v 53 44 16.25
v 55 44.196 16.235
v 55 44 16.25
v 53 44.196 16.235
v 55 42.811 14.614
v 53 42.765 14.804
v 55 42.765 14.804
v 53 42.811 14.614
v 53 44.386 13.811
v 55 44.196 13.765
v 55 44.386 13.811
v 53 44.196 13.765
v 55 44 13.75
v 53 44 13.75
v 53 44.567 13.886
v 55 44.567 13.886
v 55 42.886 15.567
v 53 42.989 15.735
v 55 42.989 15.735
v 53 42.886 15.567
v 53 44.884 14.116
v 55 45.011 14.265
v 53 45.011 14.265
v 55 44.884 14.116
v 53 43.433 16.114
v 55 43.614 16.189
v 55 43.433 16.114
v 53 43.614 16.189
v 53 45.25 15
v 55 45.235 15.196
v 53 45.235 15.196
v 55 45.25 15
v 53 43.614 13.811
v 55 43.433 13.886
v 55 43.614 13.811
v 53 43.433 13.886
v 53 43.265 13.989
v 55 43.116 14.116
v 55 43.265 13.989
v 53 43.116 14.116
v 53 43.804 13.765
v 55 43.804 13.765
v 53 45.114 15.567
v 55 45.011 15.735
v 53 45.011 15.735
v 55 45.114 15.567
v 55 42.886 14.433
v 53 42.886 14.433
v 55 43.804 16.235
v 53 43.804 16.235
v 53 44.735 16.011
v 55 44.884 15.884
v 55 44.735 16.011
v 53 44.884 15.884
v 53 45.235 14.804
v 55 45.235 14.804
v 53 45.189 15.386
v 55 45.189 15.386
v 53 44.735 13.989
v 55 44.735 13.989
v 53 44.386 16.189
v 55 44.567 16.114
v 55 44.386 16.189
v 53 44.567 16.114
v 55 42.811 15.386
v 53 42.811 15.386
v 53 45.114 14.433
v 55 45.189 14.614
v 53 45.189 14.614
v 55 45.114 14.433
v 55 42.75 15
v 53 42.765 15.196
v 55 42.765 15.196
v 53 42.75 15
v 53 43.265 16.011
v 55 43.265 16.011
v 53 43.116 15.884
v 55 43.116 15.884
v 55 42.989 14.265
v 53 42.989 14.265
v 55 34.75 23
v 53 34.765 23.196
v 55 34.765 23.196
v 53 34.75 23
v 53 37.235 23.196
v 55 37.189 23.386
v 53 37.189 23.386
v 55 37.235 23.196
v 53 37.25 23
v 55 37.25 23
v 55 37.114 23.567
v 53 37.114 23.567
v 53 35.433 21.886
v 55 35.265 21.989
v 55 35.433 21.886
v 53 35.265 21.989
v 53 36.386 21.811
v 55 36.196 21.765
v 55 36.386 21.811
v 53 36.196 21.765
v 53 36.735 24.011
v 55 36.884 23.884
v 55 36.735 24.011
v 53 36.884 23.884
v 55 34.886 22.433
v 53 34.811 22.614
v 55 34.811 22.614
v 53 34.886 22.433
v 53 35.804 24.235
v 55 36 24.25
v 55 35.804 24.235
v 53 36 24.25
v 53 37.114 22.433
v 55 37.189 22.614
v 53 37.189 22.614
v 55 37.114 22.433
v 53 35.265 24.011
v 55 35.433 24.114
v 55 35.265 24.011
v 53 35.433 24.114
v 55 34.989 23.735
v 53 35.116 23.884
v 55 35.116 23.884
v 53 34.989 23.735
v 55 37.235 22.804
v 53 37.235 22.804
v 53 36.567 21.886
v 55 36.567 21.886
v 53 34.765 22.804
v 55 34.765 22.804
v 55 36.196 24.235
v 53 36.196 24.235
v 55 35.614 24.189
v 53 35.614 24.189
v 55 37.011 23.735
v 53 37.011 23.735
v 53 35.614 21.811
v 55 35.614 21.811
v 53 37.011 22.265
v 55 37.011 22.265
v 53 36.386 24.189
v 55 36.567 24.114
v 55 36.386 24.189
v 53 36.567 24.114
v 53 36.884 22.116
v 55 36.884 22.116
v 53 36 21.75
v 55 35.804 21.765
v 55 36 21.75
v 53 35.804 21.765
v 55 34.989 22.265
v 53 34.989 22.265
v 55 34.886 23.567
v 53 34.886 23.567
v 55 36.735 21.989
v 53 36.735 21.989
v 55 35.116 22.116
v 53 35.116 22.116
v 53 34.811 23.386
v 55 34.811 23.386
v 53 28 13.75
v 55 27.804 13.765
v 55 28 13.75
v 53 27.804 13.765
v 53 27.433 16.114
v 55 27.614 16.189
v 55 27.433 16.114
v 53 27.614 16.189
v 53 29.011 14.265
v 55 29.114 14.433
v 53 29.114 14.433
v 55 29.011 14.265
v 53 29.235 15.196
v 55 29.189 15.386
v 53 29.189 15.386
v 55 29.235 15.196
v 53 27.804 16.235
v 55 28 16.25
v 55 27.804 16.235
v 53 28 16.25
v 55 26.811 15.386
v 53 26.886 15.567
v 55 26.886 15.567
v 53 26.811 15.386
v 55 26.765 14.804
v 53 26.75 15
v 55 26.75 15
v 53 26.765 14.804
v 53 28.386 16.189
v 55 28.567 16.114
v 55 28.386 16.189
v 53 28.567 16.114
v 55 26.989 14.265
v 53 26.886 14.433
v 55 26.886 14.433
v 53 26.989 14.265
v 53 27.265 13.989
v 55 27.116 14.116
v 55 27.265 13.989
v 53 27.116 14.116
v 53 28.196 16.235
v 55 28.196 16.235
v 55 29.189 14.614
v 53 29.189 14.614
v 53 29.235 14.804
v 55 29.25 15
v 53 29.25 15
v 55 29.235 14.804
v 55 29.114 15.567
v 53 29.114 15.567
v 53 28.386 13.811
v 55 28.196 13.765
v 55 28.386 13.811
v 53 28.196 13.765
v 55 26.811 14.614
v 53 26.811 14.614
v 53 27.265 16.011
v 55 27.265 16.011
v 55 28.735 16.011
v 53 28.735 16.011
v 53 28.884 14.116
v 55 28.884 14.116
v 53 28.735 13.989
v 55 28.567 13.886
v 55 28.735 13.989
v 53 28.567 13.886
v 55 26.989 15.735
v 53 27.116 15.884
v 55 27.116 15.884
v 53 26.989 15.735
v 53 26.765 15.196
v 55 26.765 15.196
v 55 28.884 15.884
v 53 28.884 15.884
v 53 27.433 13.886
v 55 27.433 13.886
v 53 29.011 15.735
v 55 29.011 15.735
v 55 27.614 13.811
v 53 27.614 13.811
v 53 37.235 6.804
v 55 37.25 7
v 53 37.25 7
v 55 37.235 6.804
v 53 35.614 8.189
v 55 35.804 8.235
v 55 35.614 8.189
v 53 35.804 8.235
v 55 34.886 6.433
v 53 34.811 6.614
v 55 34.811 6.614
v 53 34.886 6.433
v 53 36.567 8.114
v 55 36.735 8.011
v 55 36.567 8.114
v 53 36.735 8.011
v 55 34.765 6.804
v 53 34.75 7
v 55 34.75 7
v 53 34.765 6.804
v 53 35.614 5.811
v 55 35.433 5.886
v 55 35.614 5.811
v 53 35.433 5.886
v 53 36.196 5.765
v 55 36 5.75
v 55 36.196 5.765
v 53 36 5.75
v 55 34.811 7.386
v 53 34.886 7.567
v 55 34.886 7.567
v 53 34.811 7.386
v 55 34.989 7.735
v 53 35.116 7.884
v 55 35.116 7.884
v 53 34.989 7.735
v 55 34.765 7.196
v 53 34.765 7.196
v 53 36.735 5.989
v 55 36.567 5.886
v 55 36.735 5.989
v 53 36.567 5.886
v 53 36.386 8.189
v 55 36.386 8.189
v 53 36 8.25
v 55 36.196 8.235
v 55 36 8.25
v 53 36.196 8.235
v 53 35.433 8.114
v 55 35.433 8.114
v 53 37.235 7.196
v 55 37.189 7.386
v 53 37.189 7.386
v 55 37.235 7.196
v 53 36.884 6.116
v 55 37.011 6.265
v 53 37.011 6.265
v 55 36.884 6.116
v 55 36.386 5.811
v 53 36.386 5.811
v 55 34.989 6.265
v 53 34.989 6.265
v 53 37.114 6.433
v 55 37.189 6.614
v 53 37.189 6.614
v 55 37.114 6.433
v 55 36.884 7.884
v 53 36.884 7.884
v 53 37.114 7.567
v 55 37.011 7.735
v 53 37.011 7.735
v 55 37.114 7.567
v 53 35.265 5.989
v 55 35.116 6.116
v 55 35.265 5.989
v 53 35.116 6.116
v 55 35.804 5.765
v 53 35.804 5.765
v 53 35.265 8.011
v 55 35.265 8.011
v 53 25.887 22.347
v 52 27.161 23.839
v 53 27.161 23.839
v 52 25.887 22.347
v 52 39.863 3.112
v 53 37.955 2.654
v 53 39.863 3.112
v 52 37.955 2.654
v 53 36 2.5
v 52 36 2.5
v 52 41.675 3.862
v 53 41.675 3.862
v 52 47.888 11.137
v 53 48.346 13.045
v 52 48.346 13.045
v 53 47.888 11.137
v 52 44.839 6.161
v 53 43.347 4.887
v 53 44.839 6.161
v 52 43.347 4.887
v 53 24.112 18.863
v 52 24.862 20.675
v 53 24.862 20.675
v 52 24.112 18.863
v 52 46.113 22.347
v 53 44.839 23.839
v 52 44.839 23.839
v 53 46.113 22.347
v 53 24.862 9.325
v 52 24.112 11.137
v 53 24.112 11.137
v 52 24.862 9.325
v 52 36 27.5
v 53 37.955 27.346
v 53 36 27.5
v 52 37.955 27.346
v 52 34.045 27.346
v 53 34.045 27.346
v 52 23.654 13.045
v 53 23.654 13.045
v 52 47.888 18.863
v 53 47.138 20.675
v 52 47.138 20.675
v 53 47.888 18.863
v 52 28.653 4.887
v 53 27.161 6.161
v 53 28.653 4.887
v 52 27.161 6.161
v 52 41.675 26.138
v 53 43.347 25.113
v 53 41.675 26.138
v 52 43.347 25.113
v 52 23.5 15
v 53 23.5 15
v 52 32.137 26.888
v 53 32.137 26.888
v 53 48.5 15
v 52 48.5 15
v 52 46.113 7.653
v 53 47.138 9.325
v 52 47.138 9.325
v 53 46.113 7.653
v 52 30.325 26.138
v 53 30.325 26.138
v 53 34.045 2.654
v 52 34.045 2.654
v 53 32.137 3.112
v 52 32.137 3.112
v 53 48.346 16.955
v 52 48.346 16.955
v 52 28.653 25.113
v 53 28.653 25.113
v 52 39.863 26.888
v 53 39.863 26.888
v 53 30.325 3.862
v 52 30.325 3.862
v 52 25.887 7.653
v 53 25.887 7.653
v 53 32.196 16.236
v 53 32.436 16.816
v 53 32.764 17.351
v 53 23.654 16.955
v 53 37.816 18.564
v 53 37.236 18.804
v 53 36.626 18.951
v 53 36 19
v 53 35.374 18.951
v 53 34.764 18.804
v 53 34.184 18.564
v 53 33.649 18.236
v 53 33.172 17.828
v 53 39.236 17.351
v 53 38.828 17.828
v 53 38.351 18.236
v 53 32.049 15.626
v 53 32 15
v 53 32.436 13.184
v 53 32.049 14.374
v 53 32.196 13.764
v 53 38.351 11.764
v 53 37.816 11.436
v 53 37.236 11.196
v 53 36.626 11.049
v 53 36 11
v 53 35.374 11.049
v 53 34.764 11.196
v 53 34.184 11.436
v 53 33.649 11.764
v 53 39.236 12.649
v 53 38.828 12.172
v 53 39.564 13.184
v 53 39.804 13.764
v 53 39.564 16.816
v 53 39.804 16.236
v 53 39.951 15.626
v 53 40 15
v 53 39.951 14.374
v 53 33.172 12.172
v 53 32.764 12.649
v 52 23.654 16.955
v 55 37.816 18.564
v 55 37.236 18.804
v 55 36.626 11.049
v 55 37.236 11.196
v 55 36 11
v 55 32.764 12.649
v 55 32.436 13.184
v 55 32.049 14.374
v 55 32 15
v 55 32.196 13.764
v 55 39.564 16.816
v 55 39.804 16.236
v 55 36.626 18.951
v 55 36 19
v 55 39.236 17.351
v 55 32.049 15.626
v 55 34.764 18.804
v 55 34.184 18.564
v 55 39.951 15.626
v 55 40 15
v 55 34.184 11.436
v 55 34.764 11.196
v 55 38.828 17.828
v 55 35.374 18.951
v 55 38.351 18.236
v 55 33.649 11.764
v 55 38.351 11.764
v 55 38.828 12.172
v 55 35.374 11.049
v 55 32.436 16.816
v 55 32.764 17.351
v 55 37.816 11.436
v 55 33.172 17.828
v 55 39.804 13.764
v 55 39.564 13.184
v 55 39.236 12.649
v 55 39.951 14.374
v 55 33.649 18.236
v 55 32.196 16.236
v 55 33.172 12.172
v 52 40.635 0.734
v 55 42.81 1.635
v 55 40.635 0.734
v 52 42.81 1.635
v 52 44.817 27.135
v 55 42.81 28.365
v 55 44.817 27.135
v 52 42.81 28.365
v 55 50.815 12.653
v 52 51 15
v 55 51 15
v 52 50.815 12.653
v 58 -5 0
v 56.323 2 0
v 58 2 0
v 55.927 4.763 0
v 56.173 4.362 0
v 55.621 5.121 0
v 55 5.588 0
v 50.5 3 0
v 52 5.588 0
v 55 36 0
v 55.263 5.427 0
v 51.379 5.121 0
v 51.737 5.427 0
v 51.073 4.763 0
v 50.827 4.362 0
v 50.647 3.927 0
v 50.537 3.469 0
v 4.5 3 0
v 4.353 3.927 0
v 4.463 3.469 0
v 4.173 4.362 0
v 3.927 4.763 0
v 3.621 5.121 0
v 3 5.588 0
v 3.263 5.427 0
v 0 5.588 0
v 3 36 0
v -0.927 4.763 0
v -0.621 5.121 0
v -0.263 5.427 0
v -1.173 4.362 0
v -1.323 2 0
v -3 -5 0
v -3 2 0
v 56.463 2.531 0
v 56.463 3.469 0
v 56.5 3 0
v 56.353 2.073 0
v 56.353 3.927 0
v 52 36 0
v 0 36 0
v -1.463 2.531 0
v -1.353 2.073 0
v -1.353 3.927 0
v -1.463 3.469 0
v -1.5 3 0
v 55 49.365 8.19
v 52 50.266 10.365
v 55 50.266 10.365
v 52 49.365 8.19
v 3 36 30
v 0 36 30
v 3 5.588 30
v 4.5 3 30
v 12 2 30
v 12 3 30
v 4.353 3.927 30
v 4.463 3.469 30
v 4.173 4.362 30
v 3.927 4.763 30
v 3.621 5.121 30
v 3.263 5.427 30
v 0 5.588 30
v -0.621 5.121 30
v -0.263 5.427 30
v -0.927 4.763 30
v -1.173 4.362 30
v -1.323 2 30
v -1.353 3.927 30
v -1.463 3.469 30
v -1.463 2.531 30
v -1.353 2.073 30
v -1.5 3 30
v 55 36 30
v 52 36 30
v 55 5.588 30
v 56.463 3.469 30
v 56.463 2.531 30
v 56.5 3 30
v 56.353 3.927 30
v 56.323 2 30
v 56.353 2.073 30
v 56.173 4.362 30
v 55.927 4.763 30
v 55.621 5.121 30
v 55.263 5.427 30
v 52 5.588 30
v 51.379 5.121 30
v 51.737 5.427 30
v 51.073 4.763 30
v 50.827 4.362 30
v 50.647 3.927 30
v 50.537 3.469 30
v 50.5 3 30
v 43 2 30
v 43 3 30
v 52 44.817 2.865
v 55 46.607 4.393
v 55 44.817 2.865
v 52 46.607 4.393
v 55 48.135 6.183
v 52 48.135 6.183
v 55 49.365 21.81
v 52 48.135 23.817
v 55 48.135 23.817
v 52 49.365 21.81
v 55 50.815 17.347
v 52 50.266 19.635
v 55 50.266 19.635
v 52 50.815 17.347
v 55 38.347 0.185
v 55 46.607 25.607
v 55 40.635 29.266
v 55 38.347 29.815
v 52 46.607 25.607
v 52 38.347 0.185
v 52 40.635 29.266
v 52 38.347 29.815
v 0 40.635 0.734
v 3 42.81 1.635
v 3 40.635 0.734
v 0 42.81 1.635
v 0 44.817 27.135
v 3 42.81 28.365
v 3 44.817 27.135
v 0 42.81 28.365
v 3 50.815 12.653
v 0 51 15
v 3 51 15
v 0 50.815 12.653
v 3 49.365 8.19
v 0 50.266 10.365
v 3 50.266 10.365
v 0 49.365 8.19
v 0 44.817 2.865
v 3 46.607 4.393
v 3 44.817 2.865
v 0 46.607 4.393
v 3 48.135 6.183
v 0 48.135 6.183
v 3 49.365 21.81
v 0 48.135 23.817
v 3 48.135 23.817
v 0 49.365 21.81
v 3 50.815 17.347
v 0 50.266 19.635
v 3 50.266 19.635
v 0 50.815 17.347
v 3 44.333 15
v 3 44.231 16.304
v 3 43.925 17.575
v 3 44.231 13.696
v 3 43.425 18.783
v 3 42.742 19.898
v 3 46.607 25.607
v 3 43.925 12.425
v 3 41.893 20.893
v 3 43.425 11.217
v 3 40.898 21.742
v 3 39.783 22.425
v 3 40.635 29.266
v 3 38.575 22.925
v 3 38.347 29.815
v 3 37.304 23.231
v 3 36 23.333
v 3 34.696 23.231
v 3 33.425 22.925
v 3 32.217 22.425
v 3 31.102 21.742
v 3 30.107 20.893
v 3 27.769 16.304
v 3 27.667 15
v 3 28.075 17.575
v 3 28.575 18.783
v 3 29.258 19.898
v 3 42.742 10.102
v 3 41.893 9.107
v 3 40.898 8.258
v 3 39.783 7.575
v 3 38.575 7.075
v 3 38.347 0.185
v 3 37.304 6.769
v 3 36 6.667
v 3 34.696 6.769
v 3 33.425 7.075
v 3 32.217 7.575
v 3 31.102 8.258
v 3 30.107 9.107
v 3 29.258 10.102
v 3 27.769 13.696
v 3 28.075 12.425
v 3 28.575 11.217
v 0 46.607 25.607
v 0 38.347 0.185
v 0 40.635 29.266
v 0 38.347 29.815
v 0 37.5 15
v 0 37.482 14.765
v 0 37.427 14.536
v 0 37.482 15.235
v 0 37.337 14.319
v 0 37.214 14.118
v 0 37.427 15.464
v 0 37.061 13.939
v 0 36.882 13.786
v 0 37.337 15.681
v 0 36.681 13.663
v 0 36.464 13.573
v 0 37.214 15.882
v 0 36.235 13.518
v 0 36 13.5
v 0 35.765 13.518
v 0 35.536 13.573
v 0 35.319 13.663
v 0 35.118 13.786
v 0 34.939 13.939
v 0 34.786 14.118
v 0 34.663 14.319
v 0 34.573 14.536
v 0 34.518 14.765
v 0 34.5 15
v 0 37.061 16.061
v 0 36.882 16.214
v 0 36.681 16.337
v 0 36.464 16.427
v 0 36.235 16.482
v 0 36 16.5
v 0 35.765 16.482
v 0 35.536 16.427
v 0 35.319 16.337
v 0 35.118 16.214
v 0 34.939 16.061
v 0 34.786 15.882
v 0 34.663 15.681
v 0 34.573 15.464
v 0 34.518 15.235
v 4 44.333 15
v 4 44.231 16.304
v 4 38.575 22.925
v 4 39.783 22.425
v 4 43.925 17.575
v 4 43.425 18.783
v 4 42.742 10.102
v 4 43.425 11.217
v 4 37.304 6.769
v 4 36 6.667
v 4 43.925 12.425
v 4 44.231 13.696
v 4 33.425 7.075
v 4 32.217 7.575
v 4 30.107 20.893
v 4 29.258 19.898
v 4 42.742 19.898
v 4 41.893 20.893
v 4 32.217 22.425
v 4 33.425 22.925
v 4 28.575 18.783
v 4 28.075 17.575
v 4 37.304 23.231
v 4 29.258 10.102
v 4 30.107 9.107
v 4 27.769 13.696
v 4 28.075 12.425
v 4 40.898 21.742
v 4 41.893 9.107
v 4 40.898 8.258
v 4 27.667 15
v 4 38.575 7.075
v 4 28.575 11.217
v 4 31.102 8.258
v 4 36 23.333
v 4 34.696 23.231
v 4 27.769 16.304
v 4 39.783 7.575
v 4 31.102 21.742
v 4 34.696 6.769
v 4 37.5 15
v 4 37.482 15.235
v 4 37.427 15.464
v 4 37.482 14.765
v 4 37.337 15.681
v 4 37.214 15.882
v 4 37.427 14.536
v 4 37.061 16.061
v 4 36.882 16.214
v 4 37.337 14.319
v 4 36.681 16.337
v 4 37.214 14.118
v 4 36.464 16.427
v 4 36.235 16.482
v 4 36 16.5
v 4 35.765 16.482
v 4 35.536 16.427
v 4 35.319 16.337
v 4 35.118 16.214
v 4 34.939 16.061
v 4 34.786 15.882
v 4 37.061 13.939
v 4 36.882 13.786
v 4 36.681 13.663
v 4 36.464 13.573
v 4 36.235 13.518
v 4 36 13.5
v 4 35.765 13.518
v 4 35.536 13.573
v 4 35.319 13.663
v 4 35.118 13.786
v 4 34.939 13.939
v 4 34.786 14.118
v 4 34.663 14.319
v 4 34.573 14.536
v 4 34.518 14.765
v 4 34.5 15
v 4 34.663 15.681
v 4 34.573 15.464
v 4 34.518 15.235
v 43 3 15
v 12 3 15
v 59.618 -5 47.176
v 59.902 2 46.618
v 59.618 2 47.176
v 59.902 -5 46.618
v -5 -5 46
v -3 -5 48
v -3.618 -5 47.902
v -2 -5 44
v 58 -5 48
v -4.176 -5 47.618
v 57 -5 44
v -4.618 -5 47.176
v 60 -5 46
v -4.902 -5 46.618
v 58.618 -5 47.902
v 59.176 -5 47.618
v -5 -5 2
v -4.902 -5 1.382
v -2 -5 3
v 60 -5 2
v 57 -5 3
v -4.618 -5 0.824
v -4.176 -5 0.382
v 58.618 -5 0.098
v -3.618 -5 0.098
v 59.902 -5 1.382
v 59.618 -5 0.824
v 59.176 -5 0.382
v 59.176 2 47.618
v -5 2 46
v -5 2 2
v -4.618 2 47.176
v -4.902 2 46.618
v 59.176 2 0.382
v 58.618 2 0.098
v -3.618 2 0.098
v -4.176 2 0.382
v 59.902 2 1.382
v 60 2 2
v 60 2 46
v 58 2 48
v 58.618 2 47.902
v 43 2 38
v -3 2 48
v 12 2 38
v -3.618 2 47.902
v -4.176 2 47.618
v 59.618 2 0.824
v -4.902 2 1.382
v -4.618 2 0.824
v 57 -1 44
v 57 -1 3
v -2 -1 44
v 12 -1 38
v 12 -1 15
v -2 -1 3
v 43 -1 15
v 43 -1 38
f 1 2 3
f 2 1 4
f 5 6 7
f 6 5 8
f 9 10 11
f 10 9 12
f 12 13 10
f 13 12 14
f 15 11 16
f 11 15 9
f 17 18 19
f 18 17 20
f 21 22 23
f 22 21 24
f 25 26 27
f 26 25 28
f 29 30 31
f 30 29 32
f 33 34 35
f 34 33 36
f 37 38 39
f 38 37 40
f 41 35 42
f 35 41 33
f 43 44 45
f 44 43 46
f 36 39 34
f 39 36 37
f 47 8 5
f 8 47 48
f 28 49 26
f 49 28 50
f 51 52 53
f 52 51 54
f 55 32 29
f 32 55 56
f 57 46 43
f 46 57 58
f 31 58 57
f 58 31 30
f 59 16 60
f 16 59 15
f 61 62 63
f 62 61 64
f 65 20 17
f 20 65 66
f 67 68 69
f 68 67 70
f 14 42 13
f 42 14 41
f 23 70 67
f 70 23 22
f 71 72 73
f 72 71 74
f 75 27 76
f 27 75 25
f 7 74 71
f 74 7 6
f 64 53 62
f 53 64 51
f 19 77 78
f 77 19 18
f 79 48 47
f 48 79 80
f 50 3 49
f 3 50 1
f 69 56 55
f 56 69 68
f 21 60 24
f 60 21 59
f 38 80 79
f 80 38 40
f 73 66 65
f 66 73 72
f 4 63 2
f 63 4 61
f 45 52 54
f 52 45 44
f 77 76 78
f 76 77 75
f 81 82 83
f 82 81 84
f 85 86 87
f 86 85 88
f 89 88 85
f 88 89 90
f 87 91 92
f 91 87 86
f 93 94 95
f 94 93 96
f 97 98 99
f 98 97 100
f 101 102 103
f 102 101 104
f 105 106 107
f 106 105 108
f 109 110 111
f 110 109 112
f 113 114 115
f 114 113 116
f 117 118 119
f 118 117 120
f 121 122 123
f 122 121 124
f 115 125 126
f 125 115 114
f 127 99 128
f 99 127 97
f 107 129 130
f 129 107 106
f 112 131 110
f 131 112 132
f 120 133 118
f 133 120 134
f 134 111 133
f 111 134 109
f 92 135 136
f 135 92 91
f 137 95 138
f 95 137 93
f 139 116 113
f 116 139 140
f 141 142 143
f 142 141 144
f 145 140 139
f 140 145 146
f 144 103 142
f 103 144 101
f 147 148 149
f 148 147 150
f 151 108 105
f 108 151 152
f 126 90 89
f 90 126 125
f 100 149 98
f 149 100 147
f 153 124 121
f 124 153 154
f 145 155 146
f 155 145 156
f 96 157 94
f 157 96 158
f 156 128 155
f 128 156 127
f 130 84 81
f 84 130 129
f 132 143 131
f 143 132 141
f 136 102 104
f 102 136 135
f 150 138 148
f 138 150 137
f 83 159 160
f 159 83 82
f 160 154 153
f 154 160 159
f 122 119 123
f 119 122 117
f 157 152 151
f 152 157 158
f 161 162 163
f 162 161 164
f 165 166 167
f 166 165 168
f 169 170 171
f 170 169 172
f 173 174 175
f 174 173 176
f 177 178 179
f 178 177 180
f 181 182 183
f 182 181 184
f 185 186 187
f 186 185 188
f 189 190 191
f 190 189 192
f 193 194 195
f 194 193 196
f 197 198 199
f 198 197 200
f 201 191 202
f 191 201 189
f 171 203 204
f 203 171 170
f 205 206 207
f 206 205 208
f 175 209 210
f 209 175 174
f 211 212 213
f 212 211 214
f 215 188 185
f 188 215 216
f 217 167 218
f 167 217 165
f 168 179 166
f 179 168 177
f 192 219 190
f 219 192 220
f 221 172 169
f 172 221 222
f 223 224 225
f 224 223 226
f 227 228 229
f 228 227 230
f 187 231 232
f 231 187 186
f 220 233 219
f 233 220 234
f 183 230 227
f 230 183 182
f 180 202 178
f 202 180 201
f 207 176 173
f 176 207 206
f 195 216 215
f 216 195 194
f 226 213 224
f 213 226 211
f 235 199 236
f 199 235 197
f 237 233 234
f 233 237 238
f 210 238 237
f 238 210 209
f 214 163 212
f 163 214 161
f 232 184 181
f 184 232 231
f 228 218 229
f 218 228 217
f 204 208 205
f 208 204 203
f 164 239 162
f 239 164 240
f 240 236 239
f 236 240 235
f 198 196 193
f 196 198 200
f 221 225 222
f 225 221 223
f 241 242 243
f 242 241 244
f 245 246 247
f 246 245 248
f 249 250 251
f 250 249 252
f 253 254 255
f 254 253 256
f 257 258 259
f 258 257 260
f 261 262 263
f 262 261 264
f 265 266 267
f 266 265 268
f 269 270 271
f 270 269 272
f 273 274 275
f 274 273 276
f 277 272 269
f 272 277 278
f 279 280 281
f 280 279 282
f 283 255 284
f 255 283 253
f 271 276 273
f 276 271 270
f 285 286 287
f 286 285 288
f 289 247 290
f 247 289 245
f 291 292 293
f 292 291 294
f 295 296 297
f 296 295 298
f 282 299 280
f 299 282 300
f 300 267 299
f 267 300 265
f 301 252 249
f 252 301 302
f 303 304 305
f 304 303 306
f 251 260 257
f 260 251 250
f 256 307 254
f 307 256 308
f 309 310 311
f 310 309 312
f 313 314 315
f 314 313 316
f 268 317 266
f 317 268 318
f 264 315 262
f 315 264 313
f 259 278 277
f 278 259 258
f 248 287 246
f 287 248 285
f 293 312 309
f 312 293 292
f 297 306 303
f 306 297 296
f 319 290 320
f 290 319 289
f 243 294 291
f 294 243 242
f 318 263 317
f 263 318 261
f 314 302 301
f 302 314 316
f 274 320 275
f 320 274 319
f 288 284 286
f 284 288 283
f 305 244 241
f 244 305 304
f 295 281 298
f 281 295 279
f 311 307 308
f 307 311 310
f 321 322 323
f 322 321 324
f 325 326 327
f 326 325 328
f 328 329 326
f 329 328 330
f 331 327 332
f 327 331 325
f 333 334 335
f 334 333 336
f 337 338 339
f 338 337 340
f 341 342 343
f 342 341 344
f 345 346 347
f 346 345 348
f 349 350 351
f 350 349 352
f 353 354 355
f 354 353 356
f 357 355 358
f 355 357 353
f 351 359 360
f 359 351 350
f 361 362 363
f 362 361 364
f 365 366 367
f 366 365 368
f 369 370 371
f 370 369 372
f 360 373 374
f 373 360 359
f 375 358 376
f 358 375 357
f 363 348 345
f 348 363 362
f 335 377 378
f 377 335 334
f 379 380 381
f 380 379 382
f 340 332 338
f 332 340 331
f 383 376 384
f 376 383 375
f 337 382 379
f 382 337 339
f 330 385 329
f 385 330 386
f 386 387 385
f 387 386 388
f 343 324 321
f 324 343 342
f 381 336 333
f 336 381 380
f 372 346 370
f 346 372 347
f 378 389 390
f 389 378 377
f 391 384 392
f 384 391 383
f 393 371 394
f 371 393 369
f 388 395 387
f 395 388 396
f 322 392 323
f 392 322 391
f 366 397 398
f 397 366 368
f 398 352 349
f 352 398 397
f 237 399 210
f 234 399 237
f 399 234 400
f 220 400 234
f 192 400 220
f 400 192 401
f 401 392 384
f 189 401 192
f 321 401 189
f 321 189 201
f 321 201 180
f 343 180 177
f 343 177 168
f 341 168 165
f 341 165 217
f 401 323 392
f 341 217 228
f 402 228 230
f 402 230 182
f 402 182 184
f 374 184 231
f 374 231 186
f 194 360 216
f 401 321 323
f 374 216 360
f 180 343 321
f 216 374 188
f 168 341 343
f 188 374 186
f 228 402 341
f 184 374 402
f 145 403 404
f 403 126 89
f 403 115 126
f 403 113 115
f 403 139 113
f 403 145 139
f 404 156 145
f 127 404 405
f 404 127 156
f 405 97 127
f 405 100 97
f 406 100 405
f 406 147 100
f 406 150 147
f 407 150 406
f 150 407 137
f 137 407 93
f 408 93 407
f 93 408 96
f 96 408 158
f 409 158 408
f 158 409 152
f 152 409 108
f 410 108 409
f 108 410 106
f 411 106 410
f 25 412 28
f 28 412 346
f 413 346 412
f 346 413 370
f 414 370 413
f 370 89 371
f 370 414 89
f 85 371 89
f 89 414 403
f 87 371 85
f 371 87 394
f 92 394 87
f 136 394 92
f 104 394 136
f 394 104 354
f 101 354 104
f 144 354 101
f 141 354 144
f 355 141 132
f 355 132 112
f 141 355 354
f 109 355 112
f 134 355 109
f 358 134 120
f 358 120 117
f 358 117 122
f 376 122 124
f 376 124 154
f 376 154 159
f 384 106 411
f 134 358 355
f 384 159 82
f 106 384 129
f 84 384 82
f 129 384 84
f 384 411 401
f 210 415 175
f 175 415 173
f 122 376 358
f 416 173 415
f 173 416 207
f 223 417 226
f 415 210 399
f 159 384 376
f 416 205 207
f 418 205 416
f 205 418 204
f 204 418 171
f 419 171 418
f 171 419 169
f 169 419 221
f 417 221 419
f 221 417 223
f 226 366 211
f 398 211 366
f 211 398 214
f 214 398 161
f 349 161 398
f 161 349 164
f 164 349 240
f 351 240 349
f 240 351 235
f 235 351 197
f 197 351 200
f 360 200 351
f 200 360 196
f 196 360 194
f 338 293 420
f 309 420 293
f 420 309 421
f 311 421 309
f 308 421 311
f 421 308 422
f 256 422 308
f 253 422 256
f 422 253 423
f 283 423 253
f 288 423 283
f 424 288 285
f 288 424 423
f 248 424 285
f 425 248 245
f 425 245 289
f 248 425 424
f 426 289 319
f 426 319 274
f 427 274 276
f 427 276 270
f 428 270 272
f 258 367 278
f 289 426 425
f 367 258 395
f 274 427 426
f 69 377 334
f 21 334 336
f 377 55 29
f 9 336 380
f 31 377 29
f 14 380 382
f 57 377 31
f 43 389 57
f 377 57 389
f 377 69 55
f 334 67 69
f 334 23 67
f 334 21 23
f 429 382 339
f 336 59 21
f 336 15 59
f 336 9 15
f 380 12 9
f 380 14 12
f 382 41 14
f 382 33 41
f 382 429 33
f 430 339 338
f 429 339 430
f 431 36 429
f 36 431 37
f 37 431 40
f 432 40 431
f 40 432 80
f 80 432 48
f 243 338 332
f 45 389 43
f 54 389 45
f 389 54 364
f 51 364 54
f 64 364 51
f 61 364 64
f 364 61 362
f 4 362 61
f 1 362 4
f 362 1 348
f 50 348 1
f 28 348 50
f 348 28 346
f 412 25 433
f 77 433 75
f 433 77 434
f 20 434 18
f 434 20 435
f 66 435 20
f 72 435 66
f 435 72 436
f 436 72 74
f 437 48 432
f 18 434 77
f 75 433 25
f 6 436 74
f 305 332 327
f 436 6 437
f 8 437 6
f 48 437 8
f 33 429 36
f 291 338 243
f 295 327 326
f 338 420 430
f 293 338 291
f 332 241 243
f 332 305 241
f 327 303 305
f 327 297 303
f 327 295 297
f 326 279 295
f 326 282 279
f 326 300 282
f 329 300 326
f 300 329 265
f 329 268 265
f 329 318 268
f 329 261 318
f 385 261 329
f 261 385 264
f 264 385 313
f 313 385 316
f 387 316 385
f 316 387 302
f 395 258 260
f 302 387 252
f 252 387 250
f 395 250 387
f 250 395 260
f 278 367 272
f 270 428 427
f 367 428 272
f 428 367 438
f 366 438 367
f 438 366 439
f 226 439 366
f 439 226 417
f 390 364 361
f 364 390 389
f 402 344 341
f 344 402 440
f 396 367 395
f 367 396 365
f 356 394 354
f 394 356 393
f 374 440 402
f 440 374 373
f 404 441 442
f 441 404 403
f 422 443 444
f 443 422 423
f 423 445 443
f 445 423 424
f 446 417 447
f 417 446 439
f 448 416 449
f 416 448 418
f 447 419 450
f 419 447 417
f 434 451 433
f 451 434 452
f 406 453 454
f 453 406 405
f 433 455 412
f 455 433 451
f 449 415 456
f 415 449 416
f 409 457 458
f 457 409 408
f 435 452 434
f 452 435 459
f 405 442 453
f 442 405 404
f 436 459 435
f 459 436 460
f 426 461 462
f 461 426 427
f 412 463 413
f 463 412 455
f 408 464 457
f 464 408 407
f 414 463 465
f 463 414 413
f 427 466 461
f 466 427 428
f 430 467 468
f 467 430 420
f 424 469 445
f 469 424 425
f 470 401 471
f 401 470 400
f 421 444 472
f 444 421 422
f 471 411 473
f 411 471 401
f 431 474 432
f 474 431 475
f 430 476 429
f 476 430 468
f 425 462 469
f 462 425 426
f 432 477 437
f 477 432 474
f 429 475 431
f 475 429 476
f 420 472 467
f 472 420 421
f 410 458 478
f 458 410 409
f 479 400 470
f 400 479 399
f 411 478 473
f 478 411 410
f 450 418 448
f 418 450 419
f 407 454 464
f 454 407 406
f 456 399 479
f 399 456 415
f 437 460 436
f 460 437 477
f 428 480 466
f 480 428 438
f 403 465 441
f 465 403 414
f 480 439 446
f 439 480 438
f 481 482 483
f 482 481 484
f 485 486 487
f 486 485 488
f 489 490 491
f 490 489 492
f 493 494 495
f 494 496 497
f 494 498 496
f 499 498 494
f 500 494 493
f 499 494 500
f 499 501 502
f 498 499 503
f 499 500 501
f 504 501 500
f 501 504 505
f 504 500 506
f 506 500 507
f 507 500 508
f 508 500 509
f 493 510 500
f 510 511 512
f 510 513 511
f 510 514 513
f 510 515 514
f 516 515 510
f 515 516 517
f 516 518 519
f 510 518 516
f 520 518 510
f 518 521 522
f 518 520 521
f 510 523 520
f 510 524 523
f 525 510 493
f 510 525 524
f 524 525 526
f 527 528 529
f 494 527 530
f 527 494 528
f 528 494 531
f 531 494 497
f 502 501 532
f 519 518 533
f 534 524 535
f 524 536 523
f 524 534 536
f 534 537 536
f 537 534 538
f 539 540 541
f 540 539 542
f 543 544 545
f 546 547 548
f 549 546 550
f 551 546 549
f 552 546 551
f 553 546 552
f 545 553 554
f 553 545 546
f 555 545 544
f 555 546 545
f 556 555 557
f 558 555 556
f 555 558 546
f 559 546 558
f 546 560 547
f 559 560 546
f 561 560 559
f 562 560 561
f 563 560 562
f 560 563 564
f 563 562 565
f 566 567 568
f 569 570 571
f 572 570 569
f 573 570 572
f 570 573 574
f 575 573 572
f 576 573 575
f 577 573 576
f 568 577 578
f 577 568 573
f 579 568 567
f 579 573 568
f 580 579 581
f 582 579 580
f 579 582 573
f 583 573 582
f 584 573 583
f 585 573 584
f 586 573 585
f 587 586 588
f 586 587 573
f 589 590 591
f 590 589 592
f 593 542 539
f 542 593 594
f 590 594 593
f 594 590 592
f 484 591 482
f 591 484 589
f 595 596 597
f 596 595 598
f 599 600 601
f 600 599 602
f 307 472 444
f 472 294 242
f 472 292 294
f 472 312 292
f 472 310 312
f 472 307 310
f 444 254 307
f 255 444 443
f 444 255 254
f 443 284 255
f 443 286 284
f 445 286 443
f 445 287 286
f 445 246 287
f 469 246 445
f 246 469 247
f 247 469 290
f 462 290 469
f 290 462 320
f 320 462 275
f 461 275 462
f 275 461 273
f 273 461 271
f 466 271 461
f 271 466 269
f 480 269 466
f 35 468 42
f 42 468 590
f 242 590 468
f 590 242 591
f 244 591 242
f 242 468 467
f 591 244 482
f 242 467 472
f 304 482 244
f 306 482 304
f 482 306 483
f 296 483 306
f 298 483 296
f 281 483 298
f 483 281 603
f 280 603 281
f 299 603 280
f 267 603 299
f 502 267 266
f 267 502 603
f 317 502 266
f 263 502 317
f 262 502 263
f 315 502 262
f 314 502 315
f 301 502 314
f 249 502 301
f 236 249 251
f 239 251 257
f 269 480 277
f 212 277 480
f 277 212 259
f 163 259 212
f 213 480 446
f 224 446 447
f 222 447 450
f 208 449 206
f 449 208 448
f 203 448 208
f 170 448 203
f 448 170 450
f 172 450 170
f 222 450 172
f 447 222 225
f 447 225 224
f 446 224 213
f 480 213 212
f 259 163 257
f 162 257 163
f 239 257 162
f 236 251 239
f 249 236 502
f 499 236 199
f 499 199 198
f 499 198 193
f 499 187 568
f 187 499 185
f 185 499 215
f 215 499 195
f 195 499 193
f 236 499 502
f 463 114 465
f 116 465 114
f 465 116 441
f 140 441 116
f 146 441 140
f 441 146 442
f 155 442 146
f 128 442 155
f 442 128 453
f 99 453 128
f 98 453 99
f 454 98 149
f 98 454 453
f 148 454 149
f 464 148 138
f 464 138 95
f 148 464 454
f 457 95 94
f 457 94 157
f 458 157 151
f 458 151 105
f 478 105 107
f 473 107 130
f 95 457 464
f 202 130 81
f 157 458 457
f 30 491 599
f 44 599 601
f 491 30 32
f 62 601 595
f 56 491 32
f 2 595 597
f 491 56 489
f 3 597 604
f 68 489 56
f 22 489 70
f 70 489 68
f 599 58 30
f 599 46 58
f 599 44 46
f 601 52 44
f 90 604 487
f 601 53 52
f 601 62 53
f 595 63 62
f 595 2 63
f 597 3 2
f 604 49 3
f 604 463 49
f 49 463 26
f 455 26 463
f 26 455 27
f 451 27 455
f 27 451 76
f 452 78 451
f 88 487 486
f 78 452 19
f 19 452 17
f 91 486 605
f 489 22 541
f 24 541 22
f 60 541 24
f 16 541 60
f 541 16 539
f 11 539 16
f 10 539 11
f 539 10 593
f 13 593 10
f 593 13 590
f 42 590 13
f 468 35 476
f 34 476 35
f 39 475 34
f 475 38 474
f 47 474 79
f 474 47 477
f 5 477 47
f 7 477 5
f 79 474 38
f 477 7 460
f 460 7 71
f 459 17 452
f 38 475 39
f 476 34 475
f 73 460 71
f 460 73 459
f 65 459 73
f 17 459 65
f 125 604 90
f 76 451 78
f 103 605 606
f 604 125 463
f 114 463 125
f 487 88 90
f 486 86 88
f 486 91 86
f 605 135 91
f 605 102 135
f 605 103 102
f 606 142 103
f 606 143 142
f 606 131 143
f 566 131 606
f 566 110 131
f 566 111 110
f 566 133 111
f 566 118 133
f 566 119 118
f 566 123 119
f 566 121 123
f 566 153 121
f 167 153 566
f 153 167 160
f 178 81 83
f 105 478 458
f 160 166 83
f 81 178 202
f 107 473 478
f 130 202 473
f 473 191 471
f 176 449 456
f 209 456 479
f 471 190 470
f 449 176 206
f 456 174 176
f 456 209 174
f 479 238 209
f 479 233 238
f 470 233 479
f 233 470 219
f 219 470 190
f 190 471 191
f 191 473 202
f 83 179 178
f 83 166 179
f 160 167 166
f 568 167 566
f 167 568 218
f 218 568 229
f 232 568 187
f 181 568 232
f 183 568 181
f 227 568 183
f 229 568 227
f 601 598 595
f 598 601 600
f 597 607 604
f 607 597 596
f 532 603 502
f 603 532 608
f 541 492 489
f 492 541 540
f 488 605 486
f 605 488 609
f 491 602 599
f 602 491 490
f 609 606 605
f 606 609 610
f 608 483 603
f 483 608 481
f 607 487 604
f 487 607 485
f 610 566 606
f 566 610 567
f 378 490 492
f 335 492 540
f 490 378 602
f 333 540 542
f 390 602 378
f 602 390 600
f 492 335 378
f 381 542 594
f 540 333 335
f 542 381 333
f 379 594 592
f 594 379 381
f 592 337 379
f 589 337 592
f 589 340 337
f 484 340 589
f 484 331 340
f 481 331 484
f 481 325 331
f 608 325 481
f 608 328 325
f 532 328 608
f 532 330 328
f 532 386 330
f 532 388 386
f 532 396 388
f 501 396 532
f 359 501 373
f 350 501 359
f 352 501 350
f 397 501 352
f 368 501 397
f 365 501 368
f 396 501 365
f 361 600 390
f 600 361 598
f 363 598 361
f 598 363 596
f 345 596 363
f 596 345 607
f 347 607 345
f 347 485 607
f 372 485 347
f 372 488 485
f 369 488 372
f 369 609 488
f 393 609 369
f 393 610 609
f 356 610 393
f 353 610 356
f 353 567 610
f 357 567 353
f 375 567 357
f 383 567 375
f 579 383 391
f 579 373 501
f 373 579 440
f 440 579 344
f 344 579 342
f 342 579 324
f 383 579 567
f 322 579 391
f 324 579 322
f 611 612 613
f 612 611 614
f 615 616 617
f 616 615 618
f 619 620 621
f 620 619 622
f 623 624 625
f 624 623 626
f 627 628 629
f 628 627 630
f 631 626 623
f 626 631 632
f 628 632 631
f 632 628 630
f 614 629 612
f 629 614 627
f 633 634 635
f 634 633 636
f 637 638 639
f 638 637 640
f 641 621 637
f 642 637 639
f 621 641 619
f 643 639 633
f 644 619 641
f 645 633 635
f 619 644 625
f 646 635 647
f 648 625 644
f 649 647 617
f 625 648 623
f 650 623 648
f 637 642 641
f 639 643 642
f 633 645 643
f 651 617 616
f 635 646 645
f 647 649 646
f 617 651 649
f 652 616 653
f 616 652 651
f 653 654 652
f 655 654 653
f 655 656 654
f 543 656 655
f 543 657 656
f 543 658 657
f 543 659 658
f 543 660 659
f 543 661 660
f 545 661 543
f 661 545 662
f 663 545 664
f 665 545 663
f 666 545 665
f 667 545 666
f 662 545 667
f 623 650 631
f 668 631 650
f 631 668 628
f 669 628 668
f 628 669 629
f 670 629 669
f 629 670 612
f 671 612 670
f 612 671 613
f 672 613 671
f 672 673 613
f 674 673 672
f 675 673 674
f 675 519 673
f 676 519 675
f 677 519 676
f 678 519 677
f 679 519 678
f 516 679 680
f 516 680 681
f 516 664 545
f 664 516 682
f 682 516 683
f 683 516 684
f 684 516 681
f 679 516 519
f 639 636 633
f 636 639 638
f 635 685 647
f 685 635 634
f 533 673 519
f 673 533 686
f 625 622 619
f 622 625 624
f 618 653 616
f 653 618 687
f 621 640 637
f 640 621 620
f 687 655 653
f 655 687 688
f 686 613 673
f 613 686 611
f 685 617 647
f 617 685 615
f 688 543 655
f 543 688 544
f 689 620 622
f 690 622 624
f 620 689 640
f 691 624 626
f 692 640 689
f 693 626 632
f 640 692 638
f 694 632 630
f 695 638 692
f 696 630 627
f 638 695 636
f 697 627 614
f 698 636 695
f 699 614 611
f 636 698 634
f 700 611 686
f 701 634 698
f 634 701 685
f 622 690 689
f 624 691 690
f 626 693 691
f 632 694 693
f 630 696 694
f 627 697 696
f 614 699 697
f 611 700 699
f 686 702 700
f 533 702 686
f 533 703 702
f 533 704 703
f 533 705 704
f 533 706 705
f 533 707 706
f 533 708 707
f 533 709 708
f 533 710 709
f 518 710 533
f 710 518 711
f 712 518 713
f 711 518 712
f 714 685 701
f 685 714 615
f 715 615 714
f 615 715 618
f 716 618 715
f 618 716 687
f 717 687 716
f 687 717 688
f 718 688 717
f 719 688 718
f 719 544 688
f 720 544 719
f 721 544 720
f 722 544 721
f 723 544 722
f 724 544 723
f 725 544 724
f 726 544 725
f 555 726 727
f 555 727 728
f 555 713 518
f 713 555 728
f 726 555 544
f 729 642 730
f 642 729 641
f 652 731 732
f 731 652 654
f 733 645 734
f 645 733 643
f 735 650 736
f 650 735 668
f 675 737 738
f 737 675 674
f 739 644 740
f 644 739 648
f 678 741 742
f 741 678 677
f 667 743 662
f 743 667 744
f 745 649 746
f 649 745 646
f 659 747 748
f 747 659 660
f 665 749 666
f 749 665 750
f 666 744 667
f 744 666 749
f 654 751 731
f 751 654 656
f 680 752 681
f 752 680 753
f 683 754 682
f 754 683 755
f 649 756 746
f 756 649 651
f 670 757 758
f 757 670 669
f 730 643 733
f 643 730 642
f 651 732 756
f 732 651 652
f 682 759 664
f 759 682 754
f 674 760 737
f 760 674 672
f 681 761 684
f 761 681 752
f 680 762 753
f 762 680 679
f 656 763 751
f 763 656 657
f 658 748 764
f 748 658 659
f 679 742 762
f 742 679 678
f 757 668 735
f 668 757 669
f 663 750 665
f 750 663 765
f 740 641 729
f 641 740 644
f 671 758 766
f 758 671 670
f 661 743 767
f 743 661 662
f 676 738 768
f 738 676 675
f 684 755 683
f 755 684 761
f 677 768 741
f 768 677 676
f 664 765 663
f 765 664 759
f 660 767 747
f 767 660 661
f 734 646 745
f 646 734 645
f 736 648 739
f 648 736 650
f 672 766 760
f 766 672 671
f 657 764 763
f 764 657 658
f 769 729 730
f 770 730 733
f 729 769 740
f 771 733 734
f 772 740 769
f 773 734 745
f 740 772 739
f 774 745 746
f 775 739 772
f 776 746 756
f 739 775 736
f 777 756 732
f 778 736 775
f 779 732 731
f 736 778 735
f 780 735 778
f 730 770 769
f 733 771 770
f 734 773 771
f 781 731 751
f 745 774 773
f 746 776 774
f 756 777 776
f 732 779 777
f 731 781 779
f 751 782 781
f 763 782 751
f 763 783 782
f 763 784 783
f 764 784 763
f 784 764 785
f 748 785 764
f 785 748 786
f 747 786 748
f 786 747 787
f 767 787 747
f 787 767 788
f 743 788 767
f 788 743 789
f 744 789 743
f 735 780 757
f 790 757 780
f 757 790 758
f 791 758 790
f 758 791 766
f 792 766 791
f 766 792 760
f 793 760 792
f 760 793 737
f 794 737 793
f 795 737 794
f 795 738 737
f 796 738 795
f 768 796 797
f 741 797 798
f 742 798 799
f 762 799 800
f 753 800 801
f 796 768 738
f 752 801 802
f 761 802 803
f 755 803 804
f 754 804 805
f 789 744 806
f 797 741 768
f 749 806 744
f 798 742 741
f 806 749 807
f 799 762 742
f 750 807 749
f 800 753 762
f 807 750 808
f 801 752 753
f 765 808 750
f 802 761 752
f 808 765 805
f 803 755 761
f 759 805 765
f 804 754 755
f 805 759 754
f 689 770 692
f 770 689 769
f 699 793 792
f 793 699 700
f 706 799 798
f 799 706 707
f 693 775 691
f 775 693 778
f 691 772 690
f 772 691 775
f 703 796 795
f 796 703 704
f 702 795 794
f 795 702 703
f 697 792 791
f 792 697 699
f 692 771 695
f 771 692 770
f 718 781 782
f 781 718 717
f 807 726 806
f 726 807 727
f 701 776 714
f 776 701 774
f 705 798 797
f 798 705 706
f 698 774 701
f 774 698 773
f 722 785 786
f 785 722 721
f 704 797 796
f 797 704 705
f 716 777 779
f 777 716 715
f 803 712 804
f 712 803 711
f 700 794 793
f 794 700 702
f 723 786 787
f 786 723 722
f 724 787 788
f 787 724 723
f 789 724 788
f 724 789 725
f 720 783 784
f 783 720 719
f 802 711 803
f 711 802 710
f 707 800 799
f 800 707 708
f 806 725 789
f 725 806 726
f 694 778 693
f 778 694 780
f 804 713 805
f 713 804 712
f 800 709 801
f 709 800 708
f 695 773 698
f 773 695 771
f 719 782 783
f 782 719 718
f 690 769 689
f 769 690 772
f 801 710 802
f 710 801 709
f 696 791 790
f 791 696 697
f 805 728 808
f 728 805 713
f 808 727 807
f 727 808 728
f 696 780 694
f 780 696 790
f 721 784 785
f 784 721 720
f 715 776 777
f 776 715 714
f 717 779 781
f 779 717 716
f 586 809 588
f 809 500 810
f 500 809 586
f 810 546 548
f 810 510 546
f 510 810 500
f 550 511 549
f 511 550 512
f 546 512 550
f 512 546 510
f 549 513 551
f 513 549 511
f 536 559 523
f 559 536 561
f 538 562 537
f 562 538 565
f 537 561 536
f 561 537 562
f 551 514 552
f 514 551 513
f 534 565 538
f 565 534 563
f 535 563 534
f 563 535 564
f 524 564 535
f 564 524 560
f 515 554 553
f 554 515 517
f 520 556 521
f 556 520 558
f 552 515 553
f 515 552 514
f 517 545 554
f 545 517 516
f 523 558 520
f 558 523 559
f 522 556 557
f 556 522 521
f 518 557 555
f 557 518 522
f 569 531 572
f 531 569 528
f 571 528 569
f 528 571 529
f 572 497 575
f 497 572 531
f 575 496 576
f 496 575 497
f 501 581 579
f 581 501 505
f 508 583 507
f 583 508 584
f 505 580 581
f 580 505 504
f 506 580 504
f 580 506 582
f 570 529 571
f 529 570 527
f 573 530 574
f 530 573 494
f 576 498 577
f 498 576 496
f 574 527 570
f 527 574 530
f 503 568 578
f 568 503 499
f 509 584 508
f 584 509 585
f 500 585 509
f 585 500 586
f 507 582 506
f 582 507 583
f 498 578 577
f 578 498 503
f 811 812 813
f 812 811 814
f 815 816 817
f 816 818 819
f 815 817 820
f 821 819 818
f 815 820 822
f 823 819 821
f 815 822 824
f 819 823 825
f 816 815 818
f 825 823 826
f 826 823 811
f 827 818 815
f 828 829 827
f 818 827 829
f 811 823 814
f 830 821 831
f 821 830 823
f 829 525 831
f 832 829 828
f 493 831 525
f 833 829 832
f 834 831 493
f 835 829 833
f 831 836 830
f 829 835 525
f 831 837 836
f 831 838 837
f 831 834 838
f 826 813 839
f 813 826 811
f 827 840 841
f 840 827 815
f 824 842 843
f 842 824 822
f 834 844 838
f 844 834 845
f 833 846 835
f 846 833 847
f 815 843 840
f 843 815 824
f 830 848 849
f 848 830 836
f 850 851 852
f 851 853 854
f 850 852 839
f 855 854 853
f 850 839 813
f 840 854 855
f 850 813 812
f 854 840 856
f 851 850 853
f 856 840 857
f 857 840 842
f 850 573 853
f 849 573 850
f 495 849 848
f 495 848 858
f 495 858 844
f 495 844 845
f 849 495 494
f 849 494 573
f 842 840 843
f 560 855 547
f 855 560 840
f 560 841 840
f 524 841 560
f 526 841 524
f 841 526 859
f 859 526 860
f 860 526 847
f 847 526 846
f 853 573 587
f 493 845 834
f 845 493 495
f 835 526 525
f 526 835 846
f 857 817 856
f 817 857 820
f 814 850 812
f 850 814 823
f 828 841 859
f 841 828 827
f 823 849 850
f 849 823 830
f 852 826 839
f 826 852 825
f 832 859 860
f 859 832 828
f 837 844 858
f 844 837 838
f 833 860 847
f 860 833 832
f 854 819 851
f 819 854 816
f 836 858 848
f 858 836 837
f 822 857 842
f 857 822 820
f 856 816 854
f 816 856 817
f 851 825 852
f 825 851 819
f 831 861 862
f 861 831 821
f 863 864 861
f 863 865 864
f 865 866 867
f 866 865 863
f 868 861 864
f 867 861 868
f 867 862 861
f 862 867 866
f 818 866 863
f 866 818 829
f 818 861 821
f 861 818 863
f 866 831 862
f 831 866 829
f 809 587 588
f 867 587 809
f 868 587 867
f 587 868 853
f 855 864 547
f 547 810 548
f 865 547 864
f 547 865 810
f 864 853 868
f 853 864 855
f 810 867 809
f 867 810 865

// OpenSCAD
// file: turnigy2k.scad
// A Turnigy 2K actioncam.
module turnigy2k () {
    body=[59, 41, 25];

    //Body.
    cube(body);

    ld = 5;
    lr = 21/2;
    lo = 4.5;
  
    // Lens.
    translate(body + [-lr-lo, -lr-lo, 0])
        cylinder(ld, lr, lr);

    bd = 0.5;
    br = 10/2;

    // OK button.
    translate([6+br, body[1], 7+br])
        rotate(-90, [1, 0, 0])
        cylinder(bd, br, br);

    // Mode button.
    translate([6+br, body[1]-br-10, body[2]])
        cylinder(bd, br, br);

    // Up/down buttons.
    updown = [5, 23, 1];

    //
    translate([0, (body-updown)[1]/2, 6])
        rotate(90, [0, -1, 0])
        cube(updown);

    screen=[31, 23, 10];

    // Screen.
    translate([(body-screen)[0]/2, 12, 0.1-10])
        cube(screen);
}
// file: bracket.scad
// The servo mount bracket.
module bracket() {
       t = 3;
       w = 30;
       h = 52;
       d = 36;
       sd = 25;

       $fn = 40;

       // Main arm.
       module arm() {
	 hull () {
	   cube([t, w, w]);
	   translate([0, d, w/2])
	     rotate(90, [0, 1, 0])
	     cylinder(t, w/2, w/2);
	 }
       }

       // Holes in the left arm.
       module servo_holes() {
	   // Servo hole.
	   translate([0, d, w/2])
	     rotate(90, [0,1,0])
	     {
	       // Servo horn indent.
	       translate([0, 0, -1])
		 cylinder(1+1, sd/2, sd/2);
	       // Screw hole.
	       translate([0, 0, -1])
		 cylinder(t+2, 8/2, 8/2);
	       // Outer screw holes.
	       for (i = [0:90:360]) {
		 rotate(i)
		 translate([0, 8, -1])
		   cylinder(t+2, 2.5/2, 2.5/2);
	     }
	   }
       }

       module left_arm() {
	 difference () {
	   arm();
	   servo_holes();
	 }
       }

       module right_arm() {
	 difference () {
	   union () {
	     arm();

	     translate([2, d, w/2])
	     rotate(90, [0,1,0])
	       cylinder(2, sd/3, sd/3);
	   }
           // Bolt hole.
	   translate([2-3, d, w/2])
	     rotate(90, [0,1,0])
	     cylinder(t+2+2, 3/2, 3/2);
	 }
       }

       // Bracket made of two arms and a joiner.
       union () {
	 translate([h, 0, 0])
	   left_arm();

	 translate([0, 0, 0])
	   right_arm();

         cube([h, t, w]);

	 // Fill in the corners.
	 translate([0+t/2, t, 0])
             cylinder(w, t, t);
	 translate([h+t/2, t, 0])
             cylinder(w, t, t);
       }
}
// main file
include <bracket.scad>;
include <turnigy2k.scad>;

$fn=20;

// Plate that the camera mounts into.
module plate () {
  m=6;
  d=7;
  // Corner radius.
  r=2;
  w=59-r*2+m;
  h=42-r*2+m;

  translate([r, r, 0])
    hull () {
      cylinder(d, r, r);
      translate([w, h, 0])
          cylinder(7, r, r);
      translate([0, h, 0])
          cylinder(7, r, r);
      translate([w, 0, 0])
          cylinder(7, r, r);
  }
  // Text on the top.
  color("grey")
      translate([r*2, h+r*2, d*3/4])
      rotate(90, [-1, 0, 0])
      text("pipoint v1", size=d/2+1);
}

// Camera mount assembly.
module camera_mount() {
    difference () {
        union () {
            bracket();
            translate([-5, 2, 0])
                rotate(90, [1, 0, 0])
                plate();
        }
        translate([-2, -1, 3])
            rotate(90, [1, 0, 0])
            turnigy2k();
    }
}

camera_mount();
